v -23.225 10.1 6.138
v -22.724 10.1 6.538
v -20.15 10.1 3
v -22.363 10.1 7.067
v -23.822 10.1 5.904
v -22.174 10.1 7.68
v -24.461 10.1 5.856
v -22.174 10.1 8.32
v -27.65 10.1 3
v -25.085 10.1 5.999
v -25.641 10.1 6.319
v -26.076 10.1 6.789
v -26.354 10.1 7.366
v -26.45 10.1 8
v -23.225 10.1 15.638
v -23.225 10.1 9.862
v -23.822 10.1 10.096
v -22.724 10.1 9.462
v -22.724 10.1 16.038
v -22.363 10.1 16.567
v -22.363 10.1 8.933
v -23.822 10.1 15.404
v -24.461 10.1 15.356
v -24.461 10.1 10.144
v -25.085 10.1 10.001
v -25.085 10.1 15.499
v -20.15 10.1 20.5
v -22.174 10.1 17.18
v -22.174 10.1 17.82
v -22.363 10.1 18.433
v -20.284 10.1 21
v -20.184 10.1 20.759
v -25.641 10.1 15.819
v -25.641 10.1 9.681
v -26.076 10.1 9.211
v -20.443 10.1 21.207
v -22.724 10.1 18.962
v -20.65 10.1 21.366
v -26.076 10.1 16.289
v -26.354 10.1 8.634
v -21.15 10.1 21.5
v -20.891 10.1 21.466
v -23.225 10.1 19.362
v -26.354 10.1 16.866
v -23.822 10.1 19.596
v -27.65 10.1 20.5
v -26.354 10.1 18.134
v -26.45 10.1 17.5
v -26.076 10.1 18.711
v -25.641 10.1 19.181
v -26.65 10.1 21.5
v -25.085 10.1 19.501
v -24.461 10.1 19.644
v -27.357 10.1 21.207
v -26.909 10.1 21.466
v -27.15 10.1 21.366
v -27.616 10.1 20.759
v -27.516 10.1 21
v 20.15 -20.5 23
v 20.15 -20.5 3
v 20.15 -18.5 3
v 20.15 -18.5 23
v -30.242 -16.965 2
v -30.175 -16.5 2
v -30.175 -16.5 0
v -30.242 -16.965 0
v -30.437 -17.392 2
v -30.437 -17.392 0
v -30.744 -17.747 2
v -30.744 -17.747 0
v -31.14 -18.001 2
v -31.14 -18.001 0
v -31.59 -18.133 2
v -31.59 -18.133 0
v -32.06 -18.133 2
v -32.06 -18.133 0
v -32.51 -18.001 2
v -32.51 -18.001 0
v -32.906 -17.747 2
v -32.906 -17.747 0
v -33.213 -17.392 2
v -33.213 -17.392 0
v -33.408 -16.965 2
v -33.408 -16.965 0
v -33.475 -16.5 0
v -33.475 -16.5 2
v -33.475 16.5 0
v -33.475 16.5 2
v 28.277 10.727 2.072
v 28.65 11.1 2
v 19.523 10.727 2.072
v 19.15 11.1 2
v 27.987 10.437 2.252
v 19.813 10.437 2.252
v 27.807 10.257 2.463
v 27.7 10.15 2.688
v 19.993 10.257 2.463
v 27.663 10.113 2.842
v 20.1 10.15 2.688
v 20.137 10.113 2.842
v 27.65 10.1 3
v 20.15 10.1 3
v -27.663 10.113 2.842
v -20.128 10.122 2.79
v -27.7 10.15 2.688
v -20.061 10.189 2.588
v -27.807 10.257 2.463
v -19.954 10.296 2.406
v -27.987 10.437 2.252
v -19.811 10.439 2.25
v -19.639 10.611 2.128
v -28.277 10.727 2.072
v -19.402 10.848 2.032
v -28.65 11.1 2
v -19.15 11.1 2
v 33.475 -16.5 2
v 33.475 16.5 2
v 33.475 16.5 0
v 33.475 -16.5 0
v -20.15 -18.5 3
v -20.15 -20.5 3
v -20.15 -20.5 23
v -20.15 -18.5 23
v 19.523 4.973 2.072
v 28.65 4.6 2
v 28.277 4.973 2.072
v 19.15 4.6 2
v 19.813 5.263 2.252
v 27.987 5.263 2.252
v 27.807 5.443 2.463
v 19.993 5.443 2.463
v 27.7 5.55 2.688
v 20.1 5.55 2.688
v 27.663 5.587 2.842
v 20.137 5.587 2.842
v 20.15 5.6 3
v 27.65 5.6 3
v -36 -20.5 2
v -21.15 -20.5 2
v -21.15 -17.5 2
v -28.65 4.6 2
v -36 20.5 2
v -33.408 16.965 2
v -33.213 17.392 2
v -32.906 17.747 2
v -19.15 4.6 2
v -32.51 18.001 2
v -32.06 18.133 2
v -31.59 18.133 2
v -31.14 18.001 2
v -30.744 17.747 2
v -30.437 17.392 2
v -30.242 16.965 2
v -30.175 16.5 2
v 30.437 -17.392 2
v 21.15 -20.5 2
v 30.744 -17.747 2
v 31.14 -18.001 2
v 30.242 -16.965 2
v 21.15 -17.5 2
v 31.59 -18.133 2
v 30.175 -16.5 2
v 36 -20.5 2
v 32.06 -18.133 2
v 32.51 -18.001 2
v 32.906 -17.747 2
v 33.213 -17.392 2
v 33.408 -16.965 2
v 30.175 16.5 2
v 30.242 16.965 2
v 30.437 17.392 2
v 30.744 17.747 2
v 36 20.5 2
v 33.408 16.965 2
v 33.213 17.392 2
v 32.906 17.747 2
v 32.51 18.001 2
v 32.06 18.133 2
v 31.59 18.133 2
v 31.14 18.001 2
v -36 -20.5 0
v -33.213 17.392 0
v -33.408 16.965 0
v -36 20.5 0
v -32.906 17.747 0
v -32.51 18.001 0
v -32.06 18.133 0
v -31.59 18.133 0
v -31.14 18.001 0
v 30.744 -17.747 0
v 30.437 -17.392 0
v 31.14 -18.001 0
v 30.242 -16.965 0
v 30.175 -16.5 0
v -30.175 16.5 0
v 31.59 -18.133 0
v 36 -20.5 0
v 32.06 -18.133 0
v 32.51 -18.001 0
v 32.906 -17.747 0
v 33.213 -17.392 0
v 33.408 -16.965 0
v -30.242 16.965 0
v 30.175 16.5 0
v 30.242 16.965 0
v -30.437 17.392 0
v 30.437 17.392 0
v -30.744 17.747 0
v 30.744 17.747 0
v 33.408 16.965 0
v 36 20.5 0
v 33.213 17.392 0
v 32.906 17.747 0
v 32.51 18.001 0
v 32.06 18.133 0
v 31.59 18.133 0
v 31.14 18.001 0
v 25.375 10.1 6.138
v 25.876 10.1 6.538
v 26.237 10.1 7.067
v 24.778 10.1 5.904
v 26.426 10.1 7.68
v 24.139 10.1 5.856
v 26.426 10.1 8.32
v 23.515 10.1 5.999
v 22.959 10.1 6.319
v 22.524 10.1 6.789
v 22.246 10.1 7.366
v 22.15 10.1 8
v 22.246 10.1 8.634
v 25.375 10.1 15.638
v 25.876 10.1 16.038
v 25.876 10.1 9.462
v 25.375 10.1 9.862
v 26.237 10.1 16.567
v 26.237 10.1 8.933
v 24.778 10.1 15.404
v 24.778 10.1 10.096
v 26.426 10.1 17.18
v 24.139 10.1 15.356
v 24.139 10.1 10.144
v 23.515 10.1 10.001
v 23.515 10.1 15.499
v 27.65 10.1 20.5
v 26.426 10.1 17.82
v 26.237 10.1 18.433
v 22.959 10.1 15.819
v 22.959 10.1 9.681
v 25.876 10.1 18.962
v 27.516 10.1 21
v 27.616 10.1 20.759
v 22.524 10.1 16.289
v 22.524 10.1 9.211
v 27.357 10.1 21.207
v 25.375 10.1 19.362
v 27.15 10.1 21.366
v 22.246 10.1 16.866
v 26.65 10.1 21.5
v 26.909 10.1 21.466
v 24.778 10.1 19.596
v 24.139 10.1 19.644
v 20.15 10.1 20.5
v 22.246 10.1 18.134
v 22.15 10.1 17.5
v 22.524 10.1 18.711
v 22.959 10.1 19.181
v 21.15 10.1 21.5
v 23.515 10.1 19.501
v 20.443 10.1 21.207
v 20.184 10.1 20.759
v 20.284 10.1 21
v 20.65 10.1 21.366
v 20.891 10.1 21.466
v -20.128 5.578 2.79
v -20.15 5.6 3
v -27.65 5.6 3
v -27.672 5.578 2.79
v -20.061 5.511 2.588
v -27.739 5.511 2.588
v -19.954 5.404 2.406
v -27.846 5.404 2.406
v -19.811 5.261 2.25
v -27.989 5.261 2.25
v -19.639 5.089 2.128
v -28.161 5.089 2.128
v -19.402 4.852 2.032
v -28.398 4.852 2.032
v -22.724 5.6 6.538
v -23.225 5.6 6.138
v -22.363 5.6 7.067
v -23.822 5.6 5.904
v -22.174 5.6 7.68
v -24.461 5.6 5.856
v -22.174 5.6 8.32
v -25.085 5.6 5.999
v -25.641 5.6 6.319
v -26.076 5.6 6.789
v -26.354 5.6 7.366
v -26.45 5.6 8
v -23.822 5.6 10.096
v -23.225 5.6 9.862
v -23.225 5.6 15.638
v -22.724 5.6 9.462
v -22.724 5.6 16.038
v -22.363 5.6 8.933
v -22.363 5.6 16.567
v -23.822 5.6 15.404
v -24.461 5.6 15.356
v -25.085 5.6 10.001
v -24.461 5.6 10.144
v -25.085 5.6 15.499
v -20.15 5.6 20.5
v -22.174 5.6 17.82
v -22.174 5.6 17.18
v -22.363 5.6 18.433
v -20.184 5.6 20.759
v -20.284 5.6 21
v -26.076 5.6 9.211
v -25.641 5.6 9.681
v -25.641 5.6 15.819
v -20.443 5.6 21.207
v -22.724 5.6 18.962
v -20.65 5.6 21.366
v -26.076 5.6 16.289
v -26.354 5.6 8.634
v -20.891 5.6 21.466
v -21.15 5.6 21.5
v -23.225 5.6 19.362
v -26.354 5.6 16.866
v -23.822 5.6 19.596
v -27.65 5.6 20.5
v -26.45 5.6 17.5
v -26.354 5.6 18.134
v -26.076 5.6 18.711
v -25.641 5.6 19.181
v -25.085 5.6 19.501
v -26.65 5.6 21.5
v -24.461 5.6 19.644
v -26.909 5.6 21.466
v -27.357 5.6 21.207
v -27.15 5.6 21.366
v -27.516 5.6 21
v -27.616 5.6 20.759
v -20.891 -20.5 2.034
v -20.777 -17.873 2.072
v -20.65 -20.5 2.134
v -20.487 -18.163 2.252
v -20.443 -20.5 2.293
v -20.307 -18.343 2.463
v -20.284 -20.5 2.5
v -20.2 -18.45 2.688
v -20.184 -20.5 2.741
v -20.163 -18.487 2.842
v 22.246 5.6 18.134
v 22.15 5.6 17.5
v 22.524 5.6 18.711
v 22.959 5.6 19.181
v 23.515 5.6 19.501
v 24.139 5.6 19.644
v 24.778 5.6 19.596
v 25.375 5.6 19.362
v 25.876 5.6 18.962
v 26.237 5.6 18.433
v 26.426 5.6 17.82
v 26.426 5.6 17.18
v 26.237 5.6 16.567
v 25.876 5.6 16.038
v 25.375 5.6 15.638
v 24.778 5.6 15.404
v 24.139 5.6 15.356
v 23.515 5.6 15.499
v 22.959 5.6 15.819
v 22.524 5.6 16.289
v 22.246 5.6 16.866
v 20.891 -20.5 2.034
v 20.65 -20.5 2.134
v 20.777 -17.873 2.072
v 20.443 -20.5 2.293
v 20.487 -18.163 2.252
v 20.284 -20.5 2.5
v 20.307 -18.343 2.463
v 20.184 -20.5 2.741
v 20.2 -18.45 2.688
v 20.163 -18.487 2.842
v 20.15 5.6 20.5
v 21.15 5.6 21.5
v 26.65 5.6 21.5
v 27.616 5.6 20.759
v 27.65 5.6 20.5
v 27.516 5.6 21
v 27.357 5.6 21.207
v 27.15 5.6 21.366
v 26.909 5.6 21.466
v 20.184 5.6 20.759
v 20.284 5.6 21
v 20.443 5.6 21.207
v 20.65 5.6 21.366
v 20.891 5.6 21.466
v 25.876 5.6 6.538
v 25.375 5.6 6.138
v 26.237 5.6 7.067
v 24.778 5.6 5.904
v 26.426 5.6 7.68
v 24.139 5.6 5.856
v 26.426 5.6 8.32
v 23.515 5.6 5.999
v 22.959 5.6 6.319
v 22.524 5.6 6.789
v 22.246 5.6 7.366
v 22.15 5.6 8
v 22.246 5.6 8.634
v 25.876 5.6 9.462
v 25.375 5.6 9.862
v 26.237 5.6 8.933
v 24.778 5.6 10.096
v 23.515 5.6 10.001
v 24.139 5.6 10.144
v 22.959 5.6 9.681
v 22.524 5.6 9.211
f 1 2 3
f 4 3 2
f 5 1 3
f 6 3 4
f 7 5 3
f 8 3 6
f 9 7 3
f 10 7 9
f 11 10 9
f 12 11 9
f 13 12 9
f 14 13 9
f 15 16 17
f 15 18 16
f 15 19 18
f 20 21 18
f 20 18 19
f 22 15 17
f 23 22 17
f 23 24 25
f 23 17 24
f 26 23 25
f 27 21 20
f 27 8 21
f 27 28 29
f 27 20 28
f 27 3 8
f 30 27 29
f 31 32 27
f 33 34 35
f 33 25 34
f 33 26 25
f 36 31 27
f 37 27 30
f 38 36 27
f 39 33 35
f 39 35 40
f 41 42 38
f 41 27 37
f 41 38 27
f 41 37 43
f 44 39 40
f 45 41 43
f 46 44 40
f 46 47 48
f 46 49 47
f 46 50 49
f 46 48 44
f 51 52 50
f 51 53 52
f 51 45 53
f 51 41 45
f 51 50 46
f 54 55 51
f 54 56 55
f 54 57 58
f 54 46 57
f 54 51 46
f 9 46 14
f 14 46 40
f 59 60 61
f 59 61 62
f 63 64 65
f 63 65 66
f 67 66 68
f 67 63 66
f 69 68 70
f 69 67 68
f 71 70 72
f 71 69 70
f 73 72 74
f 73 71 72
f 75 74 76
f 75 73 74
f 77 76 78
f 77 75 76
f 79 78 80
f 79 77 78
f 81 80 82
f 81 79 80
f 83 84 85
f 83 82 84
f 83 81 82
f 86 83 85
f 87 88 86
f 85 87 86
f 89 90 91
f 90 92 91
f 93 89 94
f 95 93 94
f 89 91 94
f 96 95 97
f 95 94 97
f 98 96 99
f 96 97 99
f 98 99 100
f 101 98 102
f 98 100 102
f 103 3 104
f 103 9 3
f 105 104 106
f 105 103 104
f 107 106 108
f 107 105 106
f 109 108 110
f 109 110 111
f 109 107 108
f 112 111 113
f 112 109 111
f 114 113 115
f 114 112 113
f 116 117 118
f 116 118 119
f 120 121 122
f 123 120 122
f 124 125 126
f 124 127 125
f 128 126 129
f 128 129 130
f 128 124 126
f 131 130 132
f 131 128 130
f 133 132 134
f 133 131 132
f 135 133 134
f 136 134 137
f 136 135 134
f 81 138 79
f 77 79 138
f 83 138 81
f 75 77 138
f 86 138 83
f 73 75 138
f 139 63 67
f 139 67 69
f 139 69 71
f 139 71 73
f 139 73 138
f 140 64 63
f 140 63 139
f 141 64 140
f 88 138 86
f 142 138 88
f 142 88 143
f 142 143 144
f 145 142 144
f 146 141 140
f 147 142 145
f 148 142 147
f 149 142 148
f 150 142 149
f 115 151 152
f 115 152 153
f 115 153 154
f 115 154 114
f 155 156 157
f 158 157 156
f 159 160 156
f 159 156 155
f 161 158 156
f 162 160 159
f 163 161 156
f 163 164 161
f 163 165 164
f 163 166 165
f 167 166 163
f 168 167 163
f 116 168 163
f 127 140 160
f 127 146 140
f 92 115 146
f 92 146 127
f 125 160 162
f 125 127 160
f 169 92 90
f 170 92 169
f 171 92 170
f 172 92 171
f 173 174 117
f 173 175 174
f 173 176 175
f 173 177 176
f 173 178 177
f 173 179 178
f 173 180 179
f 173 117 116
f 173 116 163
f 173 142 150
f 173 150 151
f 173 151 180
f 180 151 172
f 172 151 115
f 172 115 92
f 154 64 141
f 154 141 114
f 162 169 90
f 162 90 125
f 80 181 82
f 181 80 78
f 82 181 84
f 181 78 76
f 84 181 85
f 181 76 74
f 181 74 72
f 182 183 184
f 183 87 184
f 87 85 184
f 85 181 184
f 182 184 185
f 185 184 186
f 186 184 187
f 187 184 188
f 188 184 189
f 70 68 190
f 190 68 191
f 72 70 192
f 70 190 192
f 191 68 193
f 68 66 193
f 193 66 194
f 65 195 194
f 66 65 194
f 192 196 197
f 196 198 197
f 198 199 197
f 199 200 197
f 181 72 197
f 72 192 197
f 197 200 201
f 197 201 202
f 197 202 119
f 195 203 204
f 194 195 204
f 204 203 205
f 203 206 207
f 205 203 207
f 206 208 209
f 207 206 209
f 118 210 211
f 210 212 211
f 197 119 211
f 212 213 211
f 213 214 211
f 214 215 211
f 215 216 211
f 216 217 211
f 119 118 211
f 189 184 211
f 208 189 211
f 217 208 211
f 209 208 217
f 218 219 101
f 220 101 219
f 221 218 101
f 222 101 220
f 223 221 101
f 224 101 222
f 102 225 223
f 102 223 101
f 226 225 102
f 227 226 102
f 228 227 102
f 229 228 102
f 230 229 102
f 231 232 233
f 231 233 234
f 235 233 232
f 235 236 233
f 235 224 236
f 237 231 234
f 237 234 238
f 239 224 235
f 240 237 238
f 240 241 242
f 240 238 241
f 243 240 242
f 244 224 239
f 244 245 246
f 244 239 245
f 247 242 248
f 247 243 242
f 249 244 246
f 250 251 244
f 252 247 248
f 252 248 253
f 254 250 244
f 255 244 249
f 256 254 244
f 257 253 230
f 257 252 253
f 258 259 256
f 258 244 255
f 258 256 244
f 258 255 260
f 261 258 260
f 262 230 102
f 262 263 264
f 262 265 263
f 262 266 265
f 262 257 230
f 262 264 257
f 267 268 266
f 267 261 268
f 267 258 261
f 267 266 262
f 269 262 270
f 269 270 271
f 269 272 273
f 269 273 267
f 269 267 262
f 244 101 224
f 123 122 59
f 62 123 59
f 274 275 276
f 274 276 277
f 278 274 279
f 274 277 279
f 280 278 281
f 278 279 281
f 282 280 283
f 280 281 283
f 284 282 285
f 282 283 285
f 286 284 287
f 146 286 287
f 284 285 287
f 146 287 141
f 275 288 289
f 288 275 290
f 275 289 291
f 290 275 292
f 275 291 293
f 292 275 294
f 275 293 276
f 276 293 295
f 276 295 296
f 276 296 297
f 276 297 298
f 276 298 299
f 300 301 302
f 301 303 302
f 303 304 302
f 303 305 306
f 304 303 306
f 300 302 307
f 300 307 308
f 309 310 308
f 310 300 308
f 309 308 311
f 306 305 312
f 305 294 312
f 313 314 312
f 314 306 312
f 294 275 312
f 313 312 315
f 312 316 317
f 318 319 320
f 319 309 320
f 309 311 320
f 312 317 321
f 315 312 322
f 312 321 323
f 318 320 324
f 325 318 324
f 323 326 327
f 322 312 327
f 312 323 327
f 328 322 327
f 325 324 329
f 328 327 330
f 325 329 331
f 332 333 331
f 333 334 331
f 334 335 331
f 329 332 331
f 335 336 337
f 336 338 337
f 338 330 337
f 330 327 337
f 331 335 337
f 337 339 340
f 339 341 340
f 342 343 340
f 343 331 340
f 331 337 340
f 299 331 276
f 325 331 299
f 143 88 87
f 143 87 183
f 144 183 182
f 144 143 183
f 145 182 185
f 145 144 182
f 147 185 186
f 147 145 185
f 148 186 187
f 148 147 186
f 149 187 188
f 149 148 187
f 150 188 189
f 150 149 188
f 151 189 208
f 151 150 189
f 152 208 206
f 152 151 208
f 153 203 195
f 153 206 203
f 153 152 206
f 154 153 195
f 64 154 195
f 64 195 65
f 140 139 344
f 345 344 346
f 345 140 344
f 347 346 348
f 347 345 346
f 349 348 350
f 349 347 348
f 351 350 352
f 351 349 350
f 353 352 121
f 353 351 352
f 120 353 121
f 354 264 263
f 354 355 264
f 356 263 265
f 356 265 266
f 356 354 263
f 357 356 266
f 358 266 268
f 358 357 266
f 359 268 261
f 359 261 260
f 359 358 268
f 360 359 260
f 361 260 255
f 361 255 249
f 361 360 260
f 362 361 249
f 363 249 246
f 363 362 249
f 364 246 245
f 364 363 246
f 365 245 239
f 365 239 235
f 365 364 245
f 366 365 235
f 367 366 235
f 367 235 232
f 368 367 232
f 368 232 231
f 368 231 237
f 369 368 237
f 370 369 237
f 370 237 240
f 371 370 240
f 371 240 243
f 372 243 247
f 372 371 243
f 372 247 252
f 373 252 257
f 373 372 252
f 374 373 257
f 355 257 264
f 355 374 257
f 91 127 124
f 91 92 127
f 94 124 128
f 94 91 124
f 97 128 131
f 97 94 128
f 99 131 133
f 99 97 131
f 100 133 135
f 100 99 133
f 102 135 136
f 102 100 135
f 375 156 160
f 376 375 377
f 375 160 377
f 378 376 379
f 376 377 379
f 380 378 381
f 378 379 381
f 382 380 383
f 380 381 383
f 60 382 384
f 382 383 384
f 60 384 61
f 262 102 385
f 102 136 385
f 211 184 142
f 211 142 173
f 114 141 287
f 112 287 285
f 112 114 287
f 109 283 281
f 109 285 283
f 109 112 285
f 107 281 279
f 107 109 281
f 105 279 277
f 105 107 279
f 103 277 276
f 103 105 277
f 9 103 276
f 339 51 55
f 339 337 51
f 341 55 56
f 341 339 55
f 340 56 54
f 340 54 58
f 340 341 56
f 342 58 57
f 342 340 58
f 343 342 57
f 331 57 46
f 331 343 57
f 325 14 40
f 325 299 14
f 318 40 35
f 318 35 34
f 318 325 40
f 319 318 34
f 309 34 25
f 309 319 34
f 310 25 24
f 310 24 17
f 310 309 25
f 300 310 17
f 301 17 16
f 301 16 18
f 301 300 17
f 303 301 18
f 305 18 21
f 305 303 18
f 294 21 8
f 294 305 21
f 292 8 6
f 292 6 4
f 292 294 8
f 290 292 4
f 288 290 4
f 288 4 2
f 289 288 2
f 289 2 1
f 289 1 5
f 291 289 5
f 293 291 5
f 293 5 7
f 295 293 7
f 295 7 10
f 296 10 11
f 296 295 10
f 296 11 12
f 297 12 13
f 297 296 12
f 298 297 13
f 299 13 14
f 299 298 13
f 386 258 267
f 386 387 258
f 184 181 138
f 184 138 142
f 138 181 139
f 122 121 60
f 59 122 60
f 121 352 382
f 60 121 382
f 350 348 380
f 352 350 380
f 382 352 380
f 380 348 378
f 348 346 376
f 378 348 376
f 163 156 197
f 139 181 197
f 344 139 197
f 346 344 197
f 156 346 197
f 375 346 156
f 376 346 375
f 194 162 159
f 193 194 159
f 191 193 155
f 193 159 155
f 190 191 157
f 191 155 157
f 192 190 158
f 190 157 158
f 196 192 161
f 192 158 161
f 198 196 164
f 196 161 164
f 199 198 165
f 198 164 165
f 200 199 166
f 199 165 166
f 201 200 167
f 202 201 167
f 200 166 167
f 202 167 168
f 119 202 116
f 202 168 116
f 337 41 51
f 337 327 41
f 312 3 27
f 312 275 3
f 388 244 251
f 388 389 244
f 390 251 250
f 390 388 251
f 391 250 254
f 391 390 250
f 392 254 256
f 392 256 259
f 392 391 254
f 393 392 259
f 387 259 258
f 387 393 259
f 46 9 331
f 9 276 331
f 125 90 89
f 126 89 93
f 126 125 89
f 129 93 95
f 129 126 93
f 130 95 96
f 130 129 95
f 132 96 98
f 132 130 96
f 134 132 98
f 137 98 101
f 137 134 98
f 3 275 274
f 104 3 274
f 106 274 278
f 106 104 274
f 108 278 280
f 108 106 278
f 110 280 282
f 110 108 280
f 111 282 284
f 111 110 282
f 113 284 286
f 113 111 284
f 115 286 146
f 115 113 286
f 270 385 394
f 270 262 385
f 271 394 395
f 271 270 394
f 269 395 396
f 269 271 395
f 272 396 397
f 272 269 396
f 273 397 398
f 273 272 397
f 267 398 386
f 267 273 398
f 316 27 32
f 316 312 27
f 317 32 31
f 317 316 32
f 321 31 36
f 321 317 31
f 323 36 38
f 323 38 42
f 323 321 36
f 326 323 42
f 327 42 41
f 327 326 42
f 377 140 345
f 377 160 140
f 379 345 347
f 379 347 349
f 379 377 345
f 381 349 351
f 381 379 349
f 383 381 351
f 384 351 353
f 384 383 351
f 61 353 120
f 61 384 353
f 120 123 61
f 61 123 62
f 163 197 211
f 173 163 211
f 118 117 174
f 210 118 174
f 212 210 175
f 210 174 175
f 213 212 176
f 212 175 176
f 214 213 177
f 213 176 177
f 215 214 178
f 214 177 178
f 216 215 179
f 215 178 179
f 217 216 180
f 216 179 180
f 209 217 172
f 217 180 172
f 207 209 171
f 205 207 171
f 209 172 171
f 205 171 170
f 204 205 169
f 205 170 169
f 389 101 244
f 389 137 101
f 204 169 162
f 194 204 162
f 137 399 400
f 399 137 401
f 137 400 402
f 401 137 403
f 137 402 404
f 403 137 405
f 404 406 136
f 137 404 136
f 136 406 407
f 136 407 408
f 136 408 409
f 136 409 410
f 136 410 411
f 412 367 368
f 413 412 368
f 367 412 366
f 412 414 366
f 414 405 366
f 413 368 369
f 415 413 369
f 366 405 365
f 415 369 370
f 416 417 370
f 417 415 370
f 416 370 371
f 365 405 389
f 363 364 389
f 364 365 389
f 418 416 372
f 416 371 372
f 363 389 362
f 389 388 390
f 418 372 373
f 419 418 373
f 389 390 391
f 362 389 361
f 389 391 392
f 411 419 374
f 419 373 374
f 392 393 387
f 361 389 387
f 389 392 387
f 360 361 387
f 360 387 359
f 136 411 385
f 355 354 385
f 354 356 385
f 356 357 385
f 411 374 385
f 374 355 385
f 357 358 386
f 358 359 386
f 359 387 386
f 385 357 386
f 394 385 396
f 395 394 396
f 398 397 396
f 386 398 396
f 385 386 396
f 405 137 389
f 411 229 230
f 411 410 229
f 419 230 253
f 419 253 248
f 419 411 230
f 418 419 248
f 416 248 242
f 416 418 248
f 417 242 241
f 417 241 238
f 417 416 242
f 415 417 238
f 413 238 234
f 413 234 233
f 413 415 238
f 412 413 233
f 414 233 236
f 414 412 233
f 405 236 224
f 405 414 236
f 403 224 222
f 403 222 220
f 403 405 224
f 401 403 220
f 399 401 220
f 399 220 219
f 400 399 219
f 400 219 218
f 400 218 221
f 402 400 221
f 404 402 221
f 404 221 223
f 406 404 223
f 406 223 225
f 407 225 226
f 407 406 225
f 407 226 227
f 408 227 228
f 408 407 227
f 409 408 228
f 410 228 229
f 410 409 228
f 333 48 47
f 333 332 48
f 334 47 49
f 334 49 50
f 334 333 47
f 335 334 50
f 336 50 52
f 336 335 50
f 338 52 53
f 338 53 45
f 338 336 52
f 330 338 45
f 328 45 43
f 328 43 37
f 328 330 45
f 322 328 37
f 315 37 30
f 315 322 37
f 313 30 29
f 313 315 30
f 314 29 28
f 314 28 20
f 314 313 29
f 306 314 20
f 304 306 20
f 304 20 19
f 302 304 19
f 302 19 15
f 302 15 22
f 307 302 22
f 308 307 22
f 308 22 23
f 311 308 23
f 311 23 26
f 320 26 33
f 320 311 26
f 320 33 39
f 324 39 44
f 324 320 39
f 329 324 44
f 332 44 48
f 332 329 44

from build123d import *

# Parameters (mm, degrees)
SKETCH_W          = 72
SKETCH_H          = 41
PAD_DEPTH         = 2
SKETCH001_W       = 40.3
SKETCH001_H       = 21
PAD001_DEPTH      = 2
SKETCH002_W       = 7.5
SKETCH002_H       = 19.5
SKETCH002_R       = 2.15
PAD002_DEPTH      = 2.5
PAD002_DEPTH_BACK = -2
POCKET_DEPTH      = 173.977743
FILLET_R          = 1


with BuildPart() as part:
    # Sketch → Pad (new body)
    with BuildSketch(Plane.XY):
        Rectangle(SKETCH_W, SKETCH_H)
    extrude(amount=PAD_DEPTH)

    # Sketch001 (on Face2 of Pad) → Pad001 (join)
    with BuildSketch(Plane.XZ.offset(20.5)):
        with Locations((0, 12.5)):
            Rectangle(SKETCH001_W, SKETCH001_H)
    extrude(amount=-PAD001_DEPTH)

    # Sketch002 (on DatumPlane) → Pad002 (join, two sides)
    with BuildSketch(Plane(origin=(0, 8.1, 0), x_dir=(-1, 0, 0), z_dir=(0, 1, 0))) as pad002_sk:
        with Locations((23.9, 11.75)):
            Rectangle(SKETCH002_W, SKETCH002_H)
        with Locations((24.3, 17.5)):
            Circle(SKETCH002_R, mode=Mode.SUBTRACT)
        with Locations((24.3, 8)):
            Circle(SKETCH002_R, mode=Mode.SUBTRACT)
        with Locations((-23.9, 11.75)):
            Rectangle(SKETCH002_W, SKETCH002_H)
        with Locations((-24.3, 17.5)):
            Circle(SKETCH002_R, mode=Mode.SUBTRACT)
        with Locations((-24.3, 8)):
            Circle(SKETCH002_R, mode=Mode.SUBTRACT)
    extrude(amount=-PAD002_DEPTH)
    extrude(pad002_sk.sketch, amount=-PAD002_DEPTH_BACK)

    # Sketch003 (on Face5 of Pad002) → Pocket (cut, through all)
    with BuildSketch(Plane.XY.offset(2)):
        with BuildLine():
            ThreePointArc((33.475, 16.5), (31.825, 18.15), (30.175, 16.5))
            Line((30.175, 16.5), (30.175, -16.5))
            ThreePointArc((30.175, -16.5), (31.825, -18.15), (33.475, -16.5))
            Line((33.475, 16.5), (33.475, -16.5))
        make_face()
    pocket = extrude(amount=-POCKET_DEPTH, mode=Mode.SUBTRACT)

    # Mirrored: Pocket across YZ
    add(pocket.mirror(Plane.YZ), mode=Mode.SUBTRACT)

    # Fillet
    fillet_edges = [part.edges().sort_by_distance(p)[0] for p in [
        (-20.15, 7.85, 2),
        (-23.9, 5.6, 2),
        (-27.65, 7.85, 2),
        (-23.9, 10.1, 2),
        (-20.15, 7.85, 21.5),
        (-27.65, 7.85, 21.5),
        (20.15, 7.85, 21.5),
        (27.65, 7.85, 21.5),
        (27.65, 7.85, 2),
        (23.9, 5.6, 2),
        (23.9, 10.1, 2),
        (20.15, 7.85, 2),
        (20.15, -19.5, 2),
        (0, -18.5, 2),
        (-20.15, -19.5, 2),
    ]]
    fillet(fillet_edges, radius=FILLET_R)


solid = part.part
